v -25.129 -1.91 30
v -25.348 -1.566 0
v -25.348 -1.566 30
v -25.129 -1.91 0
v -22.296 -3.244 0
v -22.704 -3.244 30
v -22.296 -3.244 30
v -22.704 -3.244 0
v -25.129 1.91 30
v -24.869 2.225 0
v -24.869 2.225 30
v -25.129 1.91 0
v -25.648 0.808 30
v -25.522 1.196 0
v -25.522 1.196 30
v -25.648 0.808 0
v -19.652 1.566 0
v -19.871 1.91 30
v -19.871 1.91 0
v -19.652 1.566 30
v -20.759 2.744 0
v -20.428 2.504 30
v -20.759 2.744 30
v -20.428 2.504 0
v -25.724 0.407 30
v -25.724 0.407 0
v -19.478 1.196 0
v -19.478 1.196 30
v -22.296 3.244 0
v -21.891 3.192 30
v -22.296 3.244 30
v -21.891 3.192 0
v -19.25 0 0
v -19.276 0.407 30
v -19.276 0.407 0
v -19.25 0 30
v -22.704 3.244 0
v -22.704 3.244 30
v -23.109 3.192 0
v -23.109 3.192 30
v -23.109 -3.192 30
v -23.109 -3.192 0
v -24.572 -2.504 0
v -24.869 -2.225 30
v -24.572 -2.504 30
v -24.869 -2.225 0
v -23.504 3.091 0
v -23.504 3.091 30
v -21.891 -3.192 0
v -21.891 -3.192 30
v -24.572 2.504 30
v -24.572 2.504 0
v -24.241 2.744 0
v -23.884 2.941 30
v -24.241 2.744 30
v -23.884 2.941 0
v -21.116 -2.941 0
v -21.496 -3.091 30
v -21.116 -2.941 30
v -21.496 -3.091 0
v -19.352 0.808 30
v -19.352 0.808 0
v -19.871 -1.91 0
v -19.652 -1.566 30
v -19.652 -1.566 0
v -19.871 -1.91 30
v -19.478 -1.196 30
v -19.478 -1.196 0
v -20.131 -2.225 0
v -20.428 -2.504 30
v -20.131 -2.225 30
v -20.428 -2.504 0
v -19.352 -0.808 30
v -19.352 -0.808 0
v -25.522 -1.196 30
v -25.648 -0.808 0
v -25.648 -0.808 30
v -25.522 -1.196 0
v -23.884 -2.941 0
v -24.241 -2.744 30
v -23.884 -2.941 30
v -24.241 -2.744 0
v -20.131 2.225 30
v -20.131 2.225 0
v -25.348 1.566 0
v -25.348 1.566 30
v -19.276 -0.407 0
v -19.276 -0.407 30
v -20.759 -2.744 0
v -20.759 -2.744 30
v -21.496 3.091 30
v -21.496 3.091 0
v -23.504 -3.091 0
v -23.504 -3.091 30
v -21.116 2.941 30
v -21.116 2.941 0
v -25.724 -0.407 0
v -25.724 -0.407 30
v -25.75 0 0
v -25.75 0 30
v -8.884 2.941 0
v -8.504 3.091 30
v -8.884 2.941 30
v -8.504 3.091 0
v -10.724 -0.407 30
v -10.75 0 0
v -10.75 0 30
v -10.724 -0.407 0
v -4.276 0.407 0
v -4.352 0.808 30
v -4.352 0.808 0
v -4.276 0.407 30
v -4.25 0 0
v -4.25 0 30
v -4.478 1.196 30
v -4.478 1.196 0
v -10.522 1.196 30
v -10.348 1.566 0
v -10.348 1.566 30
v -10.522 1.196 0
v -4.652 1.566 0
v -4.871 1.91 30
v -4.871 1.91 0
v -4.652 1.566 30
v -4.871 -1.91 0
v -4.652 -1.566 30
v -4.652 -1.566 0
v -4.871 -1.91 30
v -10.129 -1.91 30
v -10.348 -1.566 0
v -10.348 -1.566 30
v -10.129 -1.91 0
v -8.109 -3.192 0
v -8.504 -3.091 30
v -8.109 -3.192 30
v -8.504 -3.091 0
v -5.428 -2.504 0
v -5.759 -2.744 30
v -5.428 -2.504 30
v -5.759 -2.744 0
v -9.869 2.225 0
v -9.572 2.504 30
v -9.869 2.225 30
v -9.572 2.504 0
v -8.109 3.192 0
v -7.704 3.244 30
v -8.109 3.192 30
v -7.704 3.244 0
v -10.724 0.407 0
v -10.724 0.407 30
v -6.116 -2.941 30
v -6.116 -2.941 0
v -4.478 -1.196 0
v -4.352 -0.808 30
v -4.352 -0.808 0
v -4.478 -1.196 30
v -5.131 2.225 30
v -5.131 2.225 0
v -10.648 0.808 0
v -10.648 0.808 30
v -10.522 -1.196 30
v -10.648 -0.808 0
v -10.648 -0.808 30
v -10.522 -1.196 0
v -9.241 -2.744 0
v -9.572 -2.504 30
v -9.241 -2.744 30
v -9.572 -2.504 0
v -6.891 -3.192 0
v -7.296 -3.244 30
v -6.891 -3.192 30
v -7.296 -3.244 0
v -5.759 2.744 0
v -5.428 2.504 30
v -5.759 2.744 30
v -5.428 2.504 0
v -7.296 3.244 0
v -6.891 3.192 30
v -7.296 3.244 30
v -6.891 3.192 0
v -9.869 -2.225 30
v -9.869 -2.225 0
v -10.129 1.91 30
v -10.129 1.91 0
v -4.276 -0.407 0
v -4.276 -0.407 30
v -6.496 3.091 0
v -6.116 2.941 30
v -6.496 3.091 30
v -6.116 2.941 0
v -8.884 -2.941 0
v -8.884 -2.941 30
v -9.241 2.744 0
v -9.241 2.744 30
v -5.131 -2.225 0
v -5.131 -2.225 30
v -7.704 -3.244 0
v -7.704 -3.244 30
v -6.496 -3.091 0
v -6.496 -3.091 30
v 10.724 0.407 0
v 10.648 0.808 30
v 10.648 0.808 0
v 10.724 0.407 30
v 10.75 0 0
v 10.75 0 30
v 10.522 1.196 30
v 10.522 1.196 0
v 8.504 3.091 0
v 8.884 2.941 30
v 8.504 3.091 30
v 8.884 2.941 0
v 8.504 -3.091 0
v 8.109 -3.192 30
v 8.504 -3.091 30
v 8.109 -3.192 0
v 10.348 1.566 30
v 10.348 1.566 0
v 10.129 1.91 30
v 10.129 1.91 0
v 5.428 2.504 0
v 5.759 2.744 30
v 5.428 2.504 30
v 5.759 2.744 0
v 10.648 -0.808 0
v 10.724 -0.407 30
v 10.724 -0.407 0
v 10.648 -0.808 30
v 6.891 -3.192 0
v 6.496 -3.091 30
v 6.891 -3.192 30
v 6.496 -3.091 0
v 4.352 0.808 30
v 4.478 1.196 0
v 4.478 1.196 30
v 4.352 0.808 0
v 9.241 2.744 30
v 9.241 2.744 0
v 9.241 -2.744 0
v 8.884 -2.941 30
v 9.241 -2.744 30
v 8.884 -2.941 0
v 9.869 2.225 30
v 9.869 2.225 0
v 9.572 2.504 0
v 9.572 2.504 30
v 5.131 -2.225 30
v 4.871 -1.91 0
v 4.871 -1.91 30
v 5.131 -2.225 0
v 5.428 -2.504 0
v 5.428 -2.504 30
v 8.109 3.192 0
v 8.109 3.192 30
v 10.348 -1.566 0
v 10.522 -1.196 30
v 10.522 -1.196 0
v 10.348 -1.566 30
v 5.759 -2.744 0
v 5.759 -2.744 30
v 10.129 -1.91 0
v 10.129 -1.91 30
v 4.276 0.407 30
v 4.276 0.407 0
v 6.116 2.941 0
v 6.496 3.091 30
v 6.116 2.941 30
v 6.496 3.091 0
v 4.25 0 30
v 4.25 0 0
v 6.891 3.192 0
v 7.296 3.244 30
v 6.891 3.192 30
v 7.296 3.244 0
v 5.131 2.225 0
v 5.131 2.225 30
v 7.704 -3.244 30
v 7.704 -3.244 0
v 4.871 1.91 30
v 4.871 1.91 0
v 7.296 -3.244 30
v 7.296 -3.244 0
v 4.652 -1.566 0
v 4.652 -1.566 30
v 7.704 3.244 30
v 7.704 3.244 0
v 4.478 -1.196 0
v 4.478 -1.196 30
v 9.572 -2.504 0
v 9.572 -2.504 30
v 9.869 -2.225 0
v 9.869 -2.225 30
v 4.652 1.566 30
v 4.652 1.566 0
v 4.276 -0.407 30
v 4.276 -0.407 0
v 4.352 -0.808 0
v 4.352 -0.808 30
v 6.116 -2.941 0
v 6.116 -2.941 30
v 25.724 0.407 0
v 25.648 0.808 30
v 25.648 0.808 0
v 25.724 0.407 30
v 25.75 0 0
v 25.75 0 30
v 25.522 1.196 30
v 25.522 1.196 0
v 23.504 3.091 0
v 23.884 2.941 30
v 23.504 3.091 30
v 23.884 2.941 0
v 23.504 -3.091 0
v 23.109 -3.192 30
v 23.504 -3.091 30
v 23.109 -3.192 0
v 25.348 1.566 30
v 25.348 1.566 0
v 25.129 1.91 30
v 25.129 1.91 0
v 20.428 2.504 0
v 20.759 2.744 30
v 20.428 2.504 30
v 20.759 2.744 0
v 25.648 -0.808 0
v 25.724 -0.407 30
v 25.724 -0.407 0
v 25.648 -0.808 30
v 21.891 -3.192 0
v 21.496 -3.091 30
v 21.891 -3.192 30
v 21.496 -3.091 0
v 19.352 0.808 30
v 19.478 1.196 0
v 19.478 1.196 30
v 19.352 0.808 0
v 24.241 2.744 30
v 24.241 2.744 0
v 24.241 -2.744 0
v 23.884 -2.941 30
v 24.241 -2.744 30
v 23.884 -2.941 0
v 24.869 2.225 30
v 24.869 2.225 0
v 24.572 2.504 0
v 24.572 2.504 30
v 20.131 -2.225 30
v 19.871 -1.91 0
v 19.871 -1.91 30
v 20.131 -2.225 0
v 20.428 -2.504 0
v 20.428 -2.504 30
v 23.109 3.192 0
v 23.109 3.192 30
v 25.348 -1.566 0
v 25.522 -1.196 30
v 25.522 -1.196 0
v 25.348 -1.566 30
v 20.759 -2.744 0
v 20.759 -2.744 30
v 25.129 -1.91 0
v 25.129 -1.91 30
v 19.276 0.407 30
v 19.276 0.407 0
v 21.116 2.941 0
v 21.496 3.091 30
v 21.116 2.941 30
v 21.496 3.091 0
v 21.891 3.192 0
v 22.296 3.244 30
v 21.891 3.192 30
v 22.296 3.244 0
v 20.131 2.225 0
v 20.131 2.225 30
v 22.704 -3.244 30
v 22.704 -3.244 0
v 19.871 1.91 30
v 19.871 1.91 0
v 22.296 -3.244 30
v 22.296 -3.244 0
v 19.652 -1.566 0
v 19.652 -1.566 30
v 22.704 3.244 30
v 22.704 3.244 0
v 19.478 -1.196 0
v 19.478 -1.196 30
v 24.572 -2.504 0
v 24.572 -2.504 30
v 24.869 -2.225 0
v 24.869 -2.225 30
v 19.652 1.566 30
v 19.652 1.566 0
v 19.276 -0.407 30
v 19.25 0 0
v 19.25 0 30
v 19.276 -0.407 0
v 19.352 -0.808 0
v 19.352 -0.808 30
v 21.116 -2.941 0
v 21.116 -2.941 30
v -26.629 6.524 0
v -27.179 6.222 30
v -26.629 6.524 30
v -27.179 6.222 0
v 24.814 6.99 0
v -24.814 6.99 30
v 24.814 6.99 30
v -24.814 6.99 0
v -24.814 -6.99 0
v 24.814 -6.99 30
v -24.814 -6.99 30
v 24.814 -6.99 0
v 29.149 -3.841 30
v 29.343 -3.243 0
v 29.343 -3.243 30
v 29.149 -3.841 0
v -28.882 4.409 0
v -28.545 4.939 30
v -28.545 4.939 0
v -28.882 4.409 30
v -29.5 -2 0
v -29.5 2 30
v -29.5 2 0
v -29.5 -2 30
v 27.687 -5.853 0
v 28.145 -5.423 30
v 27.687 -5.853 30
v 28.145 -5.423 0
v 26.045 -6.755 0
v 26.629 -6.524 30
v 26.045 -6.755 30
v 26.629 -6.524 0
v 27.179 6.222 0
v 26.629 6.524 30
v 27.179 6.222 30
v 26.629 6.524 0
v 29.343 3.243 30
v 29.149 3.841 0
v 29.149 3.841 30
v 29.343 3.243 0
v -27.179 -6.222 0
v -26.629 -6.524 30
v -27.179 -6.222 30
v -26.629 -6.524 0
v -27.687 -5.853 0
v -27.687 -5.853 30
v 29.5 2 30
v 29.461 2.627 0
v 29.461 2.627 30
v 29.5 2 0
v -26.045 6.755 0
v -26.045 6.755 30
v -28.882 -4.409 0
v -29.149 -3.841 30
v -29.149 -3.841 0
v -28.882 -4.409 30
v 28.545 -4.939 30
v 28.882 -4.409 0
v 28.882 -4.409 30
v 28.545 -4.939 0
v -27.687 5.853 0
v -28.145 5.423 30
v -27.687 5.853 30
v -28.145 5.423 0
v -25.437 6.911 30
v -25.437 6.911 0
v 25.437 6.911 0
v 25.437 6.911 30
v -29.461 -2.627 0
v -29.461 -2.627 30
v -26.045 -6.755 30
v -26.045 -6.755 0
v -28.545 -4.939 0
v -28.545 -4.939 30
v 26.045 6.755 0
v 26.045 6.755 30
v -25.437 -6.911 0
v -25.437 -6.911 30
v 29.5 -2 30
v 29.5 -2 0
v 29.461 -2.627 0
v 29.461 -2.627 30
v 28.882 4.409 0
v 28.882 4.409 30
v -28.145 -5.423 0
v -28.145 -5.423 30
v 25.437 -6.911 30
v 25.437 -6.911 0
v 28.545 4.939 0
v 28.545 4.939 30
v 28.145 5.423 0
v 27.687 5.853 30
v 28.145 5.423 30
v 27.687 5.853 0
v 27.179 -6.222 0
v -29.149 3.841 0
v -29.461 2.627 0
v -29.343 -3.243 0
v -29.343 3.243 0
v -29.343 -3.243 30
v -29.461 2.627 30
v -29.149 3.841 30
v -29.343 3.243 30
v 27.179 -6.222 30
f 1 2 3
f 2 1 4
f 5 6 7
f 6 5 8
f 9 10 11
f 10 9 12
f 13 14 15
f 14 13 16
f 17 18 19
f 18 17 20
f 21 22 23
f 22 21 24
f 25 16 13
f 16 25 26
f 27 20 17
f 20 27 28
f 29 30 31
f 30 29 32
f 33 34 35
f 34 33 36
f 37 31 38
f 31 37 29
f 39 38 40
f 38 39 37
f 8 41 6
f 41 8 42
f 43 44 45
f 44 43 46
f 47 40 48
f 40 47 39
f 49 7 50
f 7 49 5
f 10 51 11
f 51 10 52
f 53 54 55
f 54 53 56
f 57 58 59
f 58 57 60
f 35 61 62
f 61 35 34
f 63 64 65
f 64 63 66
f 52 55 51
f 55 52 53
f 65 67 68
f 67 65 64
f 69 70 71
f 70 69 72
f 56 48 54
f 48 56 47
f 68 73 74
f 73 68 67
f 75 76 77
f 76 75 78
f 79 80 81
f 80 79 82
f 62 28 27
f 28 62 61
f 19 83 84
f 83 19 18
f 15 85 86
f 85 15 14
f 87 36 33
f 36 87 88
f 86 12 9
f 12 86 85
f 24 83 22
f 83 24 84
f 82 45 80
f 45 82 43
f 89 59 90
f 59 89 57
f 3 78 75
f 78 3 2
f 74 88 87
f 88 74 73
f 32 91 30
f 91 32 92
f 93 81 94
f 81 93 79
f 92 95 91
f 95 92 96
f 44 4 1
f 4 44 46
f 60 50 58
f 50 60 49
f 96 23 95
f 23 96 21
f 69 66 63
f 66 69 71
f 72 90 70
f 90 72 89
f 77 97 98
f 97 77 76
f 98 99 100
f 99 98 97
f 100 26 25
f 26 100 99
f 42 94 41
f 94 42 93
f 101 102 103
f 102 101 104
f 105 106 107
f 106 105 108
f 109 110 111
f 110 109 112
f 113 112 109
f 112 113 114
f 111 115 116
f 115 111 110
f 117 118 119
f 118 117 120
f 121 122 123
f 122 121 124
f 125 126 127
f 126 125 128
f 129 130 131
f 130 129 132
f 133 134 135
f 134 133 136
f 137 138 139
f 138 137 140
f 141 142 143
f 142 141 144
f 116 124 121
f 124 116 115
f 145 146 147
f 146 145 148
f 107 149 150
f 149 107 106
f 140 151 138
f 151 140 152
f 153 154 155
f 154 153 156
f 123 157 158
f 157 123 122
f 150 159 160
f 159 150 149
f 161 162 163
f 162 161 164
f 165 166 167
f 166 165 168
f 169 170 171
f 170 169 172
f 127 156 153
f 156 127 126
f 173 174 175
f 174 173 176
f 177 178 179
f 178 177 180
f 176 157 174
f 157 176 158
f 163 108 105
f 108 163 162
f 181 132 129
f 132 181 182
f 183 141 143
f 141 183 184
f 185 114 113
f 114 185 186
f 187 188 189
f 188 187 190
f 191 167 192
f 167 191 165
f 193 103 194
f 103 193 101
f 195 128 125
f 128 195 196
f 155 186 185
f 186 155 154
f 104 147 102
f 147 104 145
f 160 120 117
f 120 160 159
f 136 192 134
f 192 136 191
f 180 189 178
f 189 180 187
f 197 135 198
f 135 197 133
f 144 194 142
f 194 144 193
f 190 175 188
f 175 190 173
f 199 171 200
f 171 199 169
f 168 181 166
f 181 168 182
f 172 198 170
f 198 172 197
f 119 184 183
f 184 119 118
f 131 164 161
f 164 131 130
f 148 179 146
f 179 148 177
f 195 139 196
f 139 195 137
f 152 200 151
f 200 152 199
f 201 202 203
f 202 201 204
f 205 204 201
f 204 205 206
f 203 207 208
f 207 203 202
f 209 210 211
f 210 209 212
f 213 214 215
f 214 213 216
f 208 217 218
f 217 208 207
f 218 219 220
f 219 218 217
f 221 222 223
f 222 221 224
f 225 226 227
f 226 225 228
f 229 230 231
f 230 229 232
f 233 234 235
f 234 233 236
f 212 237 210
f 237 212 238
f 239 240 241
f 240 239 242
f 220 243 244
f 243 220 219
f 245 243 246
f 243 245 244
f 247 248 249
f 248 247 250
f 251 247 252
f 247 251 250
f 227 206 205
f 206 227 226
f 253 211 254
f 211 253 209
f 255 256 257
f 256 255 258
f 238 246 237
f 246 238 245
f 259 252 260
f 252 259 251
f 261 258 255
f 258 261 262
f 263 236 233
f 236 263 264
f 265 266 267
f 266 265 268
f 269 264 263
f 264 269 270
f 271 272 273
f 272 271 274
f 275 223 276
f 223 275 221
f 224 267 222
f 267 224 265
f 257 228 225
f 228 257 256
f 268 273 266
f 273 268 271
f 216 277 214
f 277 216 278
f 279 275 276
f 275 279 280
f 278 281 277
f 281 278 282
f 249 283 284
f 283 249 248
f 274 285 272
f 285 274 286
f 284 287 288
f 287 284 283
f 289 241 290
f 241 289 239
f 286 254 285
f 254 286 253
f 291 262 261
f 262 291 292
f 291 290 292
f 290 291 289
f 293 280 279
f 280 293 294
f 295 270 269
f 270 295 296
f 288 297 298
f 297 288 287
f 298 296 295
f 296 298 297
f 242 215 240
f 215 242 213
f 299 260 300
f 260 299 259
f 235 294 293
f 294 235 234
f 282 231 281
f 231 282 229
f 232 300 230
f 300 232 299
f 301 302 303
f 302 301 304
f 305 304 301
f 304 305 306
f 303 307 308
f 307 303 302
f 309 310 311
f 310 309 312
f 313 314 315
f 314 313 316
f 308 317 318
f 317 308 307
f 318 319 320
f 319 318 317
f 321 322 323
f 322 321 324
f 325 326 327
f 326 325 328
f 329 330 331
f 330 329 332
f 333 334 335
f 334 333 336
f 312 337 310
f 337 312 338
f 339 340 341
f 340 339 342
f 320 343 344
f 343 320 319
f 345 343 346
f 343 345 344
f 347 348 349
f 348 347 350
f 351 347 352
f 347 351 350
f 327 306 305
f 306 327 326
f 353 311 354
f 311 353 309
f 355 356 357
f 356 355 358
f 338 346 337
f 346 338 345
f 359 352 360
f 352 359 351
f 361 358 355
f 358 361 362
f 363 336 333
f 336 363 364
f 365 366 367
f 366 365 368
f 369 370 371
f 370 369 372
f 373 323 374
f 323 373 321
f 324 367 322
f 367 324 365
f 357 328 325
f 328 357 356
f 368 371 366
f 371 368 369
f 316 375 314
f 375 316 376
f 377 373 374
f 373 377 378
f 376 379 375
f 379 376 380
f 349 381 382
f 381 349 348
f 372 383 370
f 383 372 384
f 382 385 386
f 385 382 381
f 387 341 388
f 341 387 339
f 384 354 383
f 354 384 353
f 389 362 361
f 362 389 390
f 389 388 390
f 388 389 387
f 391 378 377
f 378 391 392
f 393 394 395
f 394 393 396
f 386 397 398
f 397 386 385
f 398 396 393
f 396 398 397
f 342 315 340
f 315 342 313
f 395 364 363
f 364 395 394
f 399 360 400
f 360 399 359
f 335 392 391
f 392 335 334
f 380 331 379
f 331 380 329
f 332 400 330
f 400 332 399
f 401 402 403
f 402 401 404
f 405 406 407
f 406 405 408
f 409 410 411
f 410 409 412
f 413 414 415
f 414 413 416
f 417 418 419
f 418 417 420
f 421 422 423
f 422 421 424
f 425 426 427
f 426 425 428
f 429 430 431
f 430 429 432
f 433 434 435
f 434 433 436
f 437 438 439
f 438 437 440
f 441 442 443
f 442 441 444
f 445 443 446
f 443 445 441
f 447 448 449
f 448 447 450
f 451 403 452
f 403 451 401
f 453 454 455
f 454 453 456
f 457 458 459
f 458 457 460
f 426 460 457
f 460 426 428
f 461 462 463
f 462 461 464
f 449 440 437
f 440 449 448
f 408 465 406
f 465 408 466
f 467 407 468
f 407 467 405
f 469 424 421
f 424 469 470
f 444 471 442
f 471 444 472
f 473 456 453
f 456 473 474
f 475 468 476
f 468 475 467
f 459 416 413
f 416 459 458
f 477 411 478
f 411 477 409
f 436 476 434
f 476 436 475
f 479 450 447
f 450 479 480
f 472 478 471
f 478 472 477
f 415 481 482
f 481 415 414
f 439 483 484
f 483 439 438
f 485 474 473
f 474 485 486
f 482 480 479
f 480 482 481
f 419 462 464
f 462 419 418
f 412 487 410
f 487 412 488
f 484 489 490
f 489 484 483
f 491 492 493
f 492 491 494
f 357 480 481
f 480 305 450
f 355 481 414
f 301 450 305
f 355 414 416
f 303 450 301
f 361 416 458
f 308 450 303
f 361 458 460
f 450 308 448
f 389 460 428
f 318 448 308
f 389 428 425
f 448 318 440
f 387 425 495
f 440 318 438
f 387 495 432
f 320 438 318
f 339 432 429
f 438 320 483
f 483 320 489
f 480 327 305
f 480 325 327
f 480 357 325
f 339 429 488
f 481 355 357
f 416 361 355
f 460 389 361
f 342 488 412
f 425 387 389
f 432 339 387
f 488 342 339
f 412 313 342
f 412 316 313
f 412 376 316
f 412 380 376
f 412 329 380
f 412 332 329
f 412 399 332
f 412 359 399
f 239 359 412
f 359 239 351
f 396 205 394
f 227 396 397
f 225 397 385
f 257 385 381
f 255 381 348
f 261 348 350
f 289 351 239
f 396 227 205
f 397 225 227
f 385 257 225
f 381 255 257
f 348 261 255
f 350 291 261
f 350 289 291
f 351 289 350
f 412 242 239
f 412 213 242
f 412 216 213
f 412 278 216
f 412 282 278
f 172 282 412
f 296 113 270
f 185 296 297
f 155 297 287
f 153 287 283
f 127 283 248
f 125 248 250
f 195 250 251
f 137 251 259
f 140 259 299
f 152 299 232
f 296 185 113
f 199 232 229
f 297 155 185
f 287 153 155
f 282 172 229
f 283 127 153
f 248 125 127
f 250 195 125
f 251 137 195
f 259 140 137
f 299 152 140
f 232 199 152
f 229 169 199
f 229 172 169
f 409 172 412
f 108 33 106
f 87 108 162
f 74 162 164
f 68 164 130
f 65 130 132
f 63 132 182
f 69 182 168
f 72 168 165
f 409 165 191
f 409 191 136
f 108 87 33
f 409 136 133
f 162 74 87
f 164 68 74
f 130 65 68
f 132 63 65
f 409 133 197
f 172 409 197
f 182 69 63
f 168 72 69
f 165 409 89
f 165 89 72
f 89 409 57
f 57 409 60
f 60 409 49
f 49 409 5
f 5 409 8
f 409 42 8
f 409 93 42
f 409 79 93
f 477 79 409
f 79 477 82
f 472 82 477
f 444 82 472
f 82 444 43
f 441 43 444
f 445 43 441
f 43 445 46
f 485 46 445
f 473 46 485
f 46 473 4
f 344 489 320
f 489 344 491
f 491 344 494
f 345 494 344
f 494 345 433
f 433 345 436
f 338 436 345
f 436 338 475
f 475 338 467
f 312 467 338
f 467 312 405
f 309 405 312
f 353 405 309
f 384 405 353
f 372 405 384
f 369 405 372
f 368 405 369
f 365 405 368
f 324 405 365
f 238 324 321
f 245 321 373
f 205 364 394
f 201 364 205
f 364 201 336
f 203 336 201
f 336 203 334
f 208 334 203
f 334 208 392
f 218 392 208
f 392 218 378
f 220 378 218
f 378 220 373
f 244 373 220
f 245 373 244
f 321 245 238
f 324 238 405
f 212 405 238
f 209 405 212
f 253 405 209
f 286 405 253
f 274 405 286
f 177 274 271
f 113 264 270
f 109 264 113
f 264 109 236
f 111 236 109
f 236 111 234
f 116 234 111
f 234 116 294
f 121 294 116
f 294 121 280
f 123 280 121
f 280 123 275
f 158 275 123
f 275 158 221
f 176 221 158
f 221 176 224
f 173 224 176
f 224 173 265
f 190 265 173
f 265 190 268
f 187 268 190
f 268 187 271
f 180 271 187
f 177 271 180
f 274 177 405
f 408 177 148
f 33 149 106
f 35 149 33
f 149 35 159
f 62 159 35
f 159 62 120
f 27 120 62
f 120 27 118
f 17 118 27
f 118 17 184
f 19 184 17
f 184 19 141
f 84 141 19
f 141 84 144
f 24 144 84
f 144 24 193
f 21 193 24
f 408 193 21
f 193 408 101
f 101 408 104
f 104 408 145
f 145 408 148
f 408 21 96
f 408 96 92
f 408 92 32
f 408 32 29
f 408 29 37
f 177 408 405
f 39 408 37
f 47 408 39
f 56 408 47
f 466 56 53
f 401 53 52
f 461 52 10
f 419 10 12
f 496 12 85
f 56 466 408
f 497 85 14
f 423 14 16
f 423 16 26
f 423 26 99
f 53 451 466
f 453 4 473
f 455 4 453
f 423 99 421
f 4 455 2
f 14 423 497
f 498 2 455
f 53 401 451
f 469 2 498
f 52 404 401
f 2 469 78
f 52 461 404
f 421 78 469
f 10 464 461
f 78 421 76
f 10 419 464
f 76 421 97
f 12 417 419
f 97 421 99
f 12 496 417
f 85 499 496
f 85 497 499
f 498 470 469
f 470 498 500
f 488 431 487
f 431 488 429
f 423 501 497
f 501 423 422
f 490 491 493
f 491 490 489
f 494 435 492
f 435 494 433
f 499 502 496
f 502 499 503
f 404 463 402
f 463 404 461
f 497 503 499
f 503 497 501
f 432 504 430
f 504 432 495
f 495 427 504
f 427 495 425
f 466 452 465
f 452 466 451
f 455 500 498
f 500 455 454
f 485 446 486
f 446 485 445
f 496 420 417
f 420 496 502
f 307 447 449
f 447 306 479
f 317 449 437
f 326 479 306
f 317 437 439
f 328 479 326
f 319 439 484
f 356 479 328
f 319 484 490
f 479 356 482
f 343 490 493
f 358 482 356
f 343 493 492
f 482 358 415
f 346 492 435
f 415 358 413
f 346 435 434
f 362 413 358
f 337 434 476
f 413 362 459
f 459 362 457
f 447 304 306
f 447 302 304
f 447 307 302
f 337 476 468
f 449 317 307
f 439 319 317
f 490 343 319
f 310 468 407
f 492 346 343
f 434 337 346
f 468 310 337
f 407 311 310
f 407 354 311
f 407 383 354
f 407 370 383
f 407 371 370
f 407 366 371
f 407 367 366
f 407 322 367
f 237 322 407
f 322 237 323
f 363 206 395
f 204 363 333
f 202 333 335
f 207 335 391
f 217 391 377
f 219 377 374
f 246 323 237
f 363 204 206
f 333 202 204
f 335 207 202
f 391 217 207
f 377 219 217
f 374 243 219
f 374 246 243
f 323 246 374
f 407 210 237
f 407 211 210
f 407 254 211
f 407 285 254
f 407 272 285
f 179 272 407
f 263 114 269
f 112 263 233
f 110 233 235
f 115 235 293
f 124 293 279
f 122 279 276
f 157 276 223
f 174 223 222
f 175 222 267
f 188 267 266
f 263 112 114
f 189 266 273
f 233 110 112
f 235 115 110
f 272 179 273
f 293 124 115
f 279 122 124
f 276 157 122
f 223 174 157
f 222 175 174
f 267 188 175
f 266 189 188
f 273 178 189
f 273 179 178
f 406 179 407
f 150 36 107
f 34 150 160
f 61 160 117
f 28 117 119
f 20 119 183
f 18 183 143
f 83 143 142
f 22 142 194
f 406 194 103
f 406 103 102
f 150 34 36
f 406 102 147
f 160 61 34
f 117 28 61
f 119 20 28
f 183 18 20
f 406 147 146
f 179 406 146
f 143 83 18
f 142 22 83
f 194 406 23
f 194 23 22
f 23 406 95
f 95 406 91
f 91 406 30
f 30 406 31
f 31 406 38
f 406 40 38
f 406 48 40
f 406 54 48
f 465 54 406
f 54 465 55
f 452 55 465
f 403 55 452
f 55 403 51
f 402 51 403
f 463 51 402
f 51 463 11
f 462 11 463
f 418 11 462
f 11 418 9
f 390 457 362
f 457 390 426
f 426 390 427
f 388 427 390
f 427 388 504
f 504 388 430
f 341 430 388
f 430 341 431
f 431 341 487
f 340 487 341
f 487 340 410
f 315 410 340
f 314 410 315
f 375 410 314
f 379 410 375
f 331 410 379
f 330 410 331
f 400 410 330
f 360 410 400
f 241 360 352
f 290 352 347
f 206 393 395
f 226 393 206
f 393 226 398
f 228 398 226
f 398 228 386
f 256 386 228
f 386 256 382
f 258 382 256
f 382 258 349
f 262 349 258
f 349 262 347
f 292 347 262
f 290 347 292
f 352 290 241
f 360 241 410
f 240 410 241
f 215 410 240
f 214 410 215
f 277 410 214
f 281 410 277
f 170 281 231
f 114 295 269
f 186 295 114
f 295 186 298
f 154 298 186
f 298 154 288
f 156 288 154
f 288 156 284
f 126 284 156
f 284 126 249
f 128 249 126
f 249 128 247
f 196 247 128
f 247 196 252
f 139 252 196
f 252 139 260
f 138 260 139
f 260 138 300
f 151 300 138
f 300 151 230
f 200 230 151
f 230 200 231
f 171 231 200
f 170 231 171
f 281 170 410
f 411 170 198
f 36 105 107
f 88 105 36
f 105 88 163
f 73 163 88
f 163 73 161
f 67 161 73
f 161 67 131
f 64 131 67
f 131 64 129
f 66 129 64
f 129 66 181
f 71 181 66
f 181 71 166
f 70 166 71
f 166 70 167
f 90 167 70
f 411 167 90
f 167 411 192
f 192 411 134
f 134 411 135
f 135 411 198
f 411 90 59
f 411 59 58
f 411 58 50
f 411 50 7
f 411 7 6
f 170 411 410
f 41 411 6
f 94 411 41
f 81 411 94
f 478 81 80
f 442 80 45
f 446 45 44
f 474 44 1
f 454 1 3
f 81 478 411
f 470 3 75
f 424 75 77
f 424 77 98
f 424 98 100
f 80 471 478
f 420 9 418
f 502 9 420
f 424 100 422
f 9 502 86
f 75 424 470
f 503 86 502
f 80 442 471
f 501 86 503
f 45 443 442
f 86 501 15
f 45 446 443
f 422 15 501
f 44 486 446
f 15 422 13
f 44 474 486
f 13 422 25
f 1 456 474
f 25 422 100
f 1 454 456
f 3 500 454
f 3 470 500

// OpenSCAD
$fn = 50;


difference() {
	union() {
		hull() {
			translate(v = [-24.5000000000, 2.0000000000, 0]) {
				cylinder(h = 30, r = 5);
			}
			translate(v = [24.5000000000, 2.0000000000, 0]) {
				cylinder(h = 30, r = 5);
			}
			translate(v = [-24.5000000000, -2.0000000000, 0]) {
				cylinder(h = 30, r = 5);
			}
			translate(v = [24.5000000000, -2.0000000000, 0]) {
				cylinder(h = 30, r = 5);
			}
		}
	}
	union() {
		translate(v = [-22.5000000000, 0.0000000000, 0]) {
			translate(v = [0, 0, -100]) {
				cylinder(h = 200, r = 3.2500000000);
			}
		}
		translate(v = [-7.5000000000, 0.0000000000, 0]) {
			translate(v = [0, 0, -100]) {
				cylinder(h = 200, r = 3.2500000000);
			}
		}
		translate(v = [7.5000000000, 0.0000000000, 0]) {
			translate(v = [0, 0, -100]) {
				cylinder(h = 200, r = 3.2500000000);
			}
		}
		translate(v = [22.5000000000, 0.0000000000, 0]) {
			translate(v = [0, 0, -100]) {
				cylinder(h = 200, r = 3.2500000000);
			}
		}
	}
}
